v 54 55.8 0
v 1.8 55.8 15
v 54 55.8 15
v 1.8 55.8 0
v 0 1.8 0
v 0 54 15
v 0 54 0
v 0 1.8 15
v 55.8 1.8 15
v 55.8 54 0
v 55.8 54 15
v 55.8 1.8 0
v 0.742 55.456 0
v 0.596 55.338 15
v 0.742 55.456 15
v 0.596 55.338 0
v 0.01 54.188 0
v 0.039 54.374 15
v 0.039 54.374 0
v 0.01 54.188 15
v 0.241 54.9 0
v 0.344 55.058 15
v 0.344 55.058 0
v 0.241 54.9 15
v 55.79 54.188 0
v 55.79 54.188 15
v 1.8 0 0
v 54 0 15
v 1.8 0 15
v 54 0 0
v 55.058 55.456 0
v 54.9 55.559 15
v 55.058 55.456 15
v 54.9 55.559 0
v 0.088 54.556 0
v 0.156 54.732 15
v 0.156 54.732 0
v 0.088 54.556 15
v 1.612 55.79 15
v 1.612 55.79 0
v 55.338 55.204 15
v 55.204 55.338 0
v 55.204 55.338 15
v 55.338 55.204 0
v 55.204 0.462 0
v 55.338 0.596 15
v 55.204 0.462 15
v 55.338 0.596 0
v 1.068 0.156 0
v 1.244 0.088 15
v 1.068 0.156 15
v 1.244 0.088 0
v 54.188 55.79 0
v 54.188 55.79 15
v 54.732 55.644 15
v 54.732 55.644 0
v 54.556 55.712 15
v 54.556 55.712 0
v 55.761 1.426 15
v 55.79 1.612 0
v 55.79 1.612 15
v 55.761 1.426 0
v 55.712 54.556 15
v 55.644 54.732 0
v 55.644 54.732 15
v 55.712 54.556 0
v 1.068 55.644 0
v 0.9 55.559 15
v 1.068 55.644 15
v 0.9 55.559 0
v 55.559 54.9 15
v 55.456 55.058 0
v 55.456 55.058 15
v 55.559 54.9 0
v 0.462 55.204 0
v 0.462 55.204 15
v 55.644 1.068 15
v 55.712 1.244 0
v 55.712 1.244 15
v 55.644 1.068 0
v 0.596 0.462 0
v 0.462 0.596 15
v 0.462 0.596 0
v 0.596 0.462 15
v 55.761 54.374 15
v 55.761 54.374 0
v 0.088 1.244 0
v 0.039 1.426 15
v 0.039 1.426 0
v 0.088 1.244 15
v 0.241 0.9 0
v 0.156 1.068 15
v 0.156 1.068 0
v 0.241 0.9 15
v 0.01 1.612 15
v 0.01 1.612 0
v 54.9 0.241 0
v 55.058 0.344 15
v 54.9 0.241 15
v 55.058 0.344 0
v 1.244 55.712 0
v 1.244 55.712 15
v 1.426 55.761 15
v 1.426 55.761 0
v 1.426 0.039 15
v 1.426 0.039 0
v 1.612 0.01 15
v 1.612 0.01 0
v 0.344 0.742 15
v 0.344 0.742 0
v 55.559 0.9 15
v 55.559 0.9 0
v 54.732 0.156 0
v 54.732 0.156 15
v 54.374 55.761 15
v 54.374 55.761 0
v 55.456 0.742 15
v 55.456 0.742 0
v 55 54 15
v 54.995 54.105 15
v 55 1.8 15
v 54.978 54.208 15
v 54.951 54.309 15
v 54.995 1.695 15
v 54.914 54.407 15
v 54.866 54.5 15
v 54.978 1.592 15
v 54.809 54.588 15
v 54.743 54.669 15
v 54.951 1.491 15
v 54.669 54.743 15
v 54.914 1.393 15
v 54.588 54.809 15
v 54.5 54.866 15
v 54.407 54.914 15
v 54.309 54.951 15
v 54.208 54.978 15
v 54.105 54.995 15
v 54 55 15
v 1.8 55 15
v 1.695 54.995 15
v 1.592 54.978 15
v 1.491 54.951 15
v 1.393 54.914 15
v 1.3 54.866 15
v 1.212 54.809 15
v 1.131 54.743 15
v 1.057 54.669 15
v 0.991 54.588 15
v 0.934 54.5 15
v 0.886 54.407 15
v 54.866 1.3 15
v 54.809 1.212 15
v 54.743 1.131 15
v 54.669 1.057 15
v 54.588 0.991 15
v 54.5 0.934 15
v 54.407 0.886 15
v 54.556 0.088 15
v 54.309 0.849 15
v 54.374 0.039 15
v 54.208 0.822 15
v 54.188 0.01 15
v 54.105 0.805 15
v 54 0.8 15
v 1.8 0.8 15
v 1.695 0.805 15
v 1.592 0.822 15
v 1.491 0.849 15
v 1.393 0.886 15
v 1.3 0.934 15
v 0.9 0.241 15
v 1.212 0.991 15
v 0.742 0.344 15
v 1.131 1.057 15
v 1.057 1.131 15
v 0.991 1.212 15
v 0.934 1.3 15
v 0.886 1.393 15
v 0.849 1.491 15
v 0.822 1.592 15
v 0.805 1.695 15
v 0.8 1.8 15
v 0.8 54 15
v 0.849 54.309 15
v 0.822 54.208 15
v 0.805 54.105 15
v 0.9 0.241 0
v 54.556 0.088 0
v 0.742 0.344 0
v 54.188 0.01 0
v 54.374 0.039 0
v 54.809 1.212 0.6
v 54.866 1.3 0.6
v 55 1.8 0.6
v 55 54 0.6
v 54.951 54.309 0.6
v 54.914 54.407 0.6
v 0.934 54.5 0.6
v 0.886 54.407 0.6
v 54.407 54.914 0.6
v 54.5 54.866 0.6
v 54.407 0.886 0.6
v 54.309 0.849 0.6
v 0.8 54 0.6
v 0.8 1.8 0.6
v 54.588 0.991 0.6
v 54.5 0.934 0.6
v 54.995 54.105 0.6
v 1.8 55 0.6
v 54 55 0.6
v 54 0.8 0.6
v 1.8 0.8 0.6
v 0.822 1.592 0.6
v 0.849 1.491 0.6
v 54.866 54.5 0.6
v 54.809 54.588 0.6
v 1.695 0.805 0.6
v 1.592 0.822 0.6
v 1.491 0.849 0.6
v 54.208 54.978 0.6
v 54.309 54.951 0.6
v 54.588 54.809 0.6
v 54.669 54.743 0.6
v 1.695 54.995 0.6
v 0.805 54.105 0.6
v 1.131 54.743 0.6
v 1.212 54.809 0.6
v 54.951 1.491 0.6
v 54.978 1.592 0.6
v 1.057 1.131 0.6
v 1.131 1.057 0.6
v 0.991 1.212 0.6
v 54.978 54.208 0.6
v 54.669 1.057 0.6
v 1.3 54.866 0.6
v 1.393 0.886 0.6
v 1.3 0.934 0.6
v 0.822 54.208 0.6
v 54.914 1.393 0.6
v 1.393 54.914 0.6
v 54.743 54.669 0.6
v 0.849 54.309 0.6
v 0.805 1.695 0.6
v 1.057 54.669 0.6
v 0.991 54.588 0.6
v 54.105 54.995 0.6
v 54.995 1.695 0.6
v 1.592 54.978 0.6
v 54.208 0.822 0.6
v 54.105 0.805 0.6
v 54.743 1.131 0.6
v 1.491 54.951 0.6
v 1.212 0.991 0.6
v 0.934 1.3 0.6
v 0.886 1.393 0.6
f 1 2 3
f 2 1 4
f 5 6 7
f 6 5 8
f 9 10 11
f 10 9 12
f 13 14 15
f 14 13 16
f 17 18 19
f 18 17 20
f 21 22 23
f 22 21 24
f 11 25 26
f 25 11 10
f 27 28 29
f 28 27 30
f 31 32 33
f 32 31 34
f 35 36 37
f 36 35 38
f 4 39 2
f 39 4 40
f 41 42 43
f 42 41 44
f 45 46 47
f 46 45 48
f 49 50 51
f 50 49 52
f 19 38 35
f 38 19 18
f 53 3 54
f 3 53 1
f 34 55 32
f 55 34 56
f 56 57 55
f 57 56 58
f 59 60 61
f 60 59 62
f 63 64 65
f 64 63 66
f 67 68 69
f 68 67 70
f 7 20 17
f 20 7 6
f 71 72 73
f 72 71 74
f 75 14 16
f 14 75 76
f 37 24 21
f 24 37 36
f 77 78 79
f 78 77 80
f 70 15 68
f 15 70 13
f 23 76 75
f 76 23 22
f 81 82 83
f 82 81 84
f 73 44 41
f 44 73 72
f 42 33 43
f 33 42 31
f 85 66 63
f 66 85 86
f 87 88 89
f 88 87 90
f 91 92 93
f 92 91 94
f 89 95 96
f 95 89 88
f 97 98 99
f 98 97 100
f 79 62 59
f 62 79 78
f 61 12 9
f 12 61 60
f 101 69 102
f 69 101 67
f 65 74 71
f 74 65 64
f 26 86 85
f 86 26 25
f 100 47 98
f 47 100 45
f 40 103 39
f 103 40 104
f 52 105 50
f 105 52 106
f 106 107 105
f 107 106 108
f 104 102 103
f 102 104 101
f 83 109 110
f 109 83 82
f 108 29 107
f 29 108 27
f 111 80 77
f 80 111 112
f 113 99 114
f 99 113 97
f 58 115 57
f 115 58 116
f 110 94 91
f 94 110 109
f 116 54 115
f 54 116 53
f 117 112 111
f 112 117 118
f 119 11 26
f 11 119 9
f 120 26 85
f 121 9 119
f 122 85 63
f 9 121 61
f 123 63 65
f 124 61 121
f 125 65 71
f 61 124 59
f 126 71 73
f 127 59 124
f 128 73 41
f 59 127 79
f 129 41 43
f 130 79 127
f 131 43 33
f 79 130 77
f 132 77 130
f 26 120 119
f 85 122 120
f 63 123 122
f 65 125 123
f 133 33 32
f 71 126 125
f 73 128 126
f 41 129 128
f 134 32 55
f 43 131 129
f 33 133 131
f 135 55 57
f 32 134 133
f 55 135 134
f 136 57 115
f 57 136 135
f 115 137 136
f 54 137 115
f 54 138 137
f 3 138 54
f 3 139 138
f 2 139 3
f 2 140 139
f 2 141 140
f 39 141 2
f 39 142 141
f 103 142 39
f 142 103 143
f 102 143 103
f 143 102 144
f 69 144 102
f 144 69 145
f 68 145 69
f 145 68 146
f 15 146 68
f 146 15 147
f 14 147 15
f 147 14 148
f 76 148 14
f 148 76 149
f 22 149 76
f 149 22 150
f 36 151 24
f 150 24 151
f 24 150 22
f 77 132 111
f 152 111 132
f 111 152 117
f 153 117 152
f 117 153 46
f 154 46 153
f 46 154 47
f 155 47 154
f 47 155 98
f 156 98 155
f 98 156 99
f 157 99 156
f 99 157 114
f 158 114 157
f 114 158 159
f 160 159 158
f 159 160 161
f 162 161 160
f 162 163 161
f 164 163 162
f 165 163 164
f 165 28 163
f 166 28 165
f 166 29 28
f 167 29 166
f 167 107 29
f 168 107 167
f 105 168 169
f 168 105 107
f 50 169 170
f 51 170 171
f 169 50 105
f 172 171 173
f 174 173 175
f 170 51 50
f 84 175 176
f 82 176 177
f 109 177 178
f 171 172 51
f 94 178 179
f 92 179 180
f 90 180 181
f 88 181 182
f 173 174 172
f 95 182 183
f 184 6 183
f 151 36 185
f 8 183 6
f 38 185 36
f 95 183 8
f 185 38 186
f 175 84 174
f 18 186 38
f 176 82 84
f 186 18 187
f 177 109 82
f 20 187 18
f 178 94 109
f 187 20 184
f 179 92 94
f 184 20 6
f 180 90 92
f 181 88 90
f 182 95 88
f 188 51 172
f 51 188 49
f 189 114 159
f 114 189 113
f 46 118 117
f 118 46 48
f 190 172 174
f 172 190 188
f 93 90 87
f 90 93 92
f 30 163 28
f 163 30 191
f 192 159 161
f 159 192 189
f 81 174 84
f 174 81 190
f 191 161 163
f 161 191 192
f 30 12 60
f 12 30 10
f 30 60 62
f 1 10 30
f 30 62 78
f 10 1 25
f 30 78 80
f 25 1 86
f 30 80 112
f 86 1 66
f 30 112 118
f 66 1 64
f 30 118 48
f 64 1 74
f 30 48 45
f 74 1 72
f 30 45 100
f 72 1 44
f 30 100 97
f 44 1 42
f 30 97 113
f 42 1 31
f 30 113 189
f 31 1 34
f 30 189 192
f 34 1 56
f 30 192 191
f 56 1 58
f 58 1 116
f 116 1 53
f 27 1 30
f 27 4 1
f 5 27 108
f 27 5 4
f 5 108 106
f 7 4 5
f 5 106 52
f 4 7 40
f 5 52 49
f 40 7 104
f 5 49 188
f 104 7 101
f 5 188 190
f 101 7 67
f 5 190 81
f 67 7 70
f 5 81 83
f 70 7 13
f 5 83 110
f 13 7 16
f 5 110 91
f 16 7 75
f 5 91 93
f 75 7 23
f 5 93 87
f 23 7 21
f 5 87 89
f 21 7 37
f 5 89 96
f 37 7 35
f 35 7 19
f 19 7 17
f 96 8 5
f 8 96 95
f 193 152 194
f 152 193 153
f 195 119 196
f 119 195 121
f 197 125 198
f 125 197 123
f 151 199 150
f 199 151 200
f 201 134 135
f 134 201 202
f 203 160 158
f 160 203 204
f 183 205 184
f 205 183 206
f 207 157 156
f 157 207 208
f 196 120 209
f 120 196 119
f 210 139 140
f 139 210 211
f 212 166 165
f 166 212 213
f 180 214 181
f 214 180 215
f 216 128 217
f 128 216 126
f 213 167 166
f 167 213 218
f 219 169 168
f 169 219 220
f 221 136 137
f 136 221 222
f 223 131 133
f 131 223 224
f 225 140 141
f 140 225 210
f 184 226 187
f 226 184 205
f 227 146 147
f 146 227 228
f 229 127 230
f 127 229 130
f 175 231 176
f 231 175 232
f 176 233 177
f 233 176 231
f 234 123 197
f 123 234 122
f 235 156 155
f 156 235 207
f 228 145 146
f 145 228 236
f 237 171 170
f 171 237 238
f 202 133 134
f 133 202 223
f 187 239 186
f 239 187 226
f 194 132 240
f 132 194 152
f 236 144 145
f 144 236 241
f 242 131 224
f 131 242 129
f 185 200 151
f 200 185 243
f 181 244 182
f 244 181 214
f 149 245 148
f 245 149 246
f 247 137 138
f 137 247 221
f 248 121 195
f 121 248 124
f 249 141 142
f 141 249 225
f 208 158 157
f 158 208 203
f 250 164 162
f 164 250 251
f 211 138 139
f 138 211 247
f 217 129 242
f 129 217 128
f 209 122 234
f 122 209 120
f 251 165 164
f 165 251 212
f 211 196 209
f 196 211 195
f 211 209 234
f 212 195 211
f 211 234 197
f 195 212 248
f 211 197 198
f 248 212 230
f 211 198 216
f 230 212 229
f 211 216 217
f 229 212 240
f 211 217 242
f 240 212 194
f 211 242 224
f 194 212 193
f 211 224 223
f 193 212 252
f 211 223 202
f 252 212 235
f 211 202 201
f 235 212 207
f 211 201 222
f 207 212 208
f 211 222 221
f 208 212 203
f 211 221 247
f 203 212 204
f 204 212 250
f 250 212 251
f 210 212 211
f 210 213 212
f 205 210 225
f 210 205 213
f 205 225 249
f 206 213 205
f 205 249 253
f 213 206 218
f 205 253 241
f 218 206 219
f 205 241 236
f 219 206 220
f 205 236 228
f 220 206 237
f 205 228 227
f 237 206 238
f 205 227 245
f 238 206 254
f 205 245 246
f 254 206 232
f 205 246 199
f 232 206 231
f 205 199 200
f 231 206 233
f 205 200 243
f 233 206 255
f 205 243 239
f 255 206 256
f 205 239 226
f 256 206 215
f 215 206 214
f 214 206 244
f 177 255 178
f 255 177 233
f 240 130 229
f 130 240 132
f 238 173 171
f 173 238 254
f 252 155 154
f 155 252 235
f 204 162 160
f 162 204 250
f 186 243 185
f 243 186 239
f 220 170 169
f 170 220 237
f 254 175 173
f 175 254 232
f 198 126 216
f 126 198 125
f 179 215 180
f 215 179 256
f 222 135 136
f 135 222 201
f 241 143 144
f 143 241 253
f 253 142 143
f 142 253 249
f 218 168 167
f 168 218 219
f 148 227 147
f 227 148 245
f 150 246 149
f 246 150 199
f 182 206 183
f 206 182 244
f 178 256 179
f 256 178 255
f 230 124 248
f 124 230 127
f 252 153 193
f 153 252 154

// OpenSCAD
// modular nozzle storage box
// version 0.0.1
// by pixelhaufen
// is licensed under CC BY-SA 3.0 -> https://creativecommons.org/licenses/by-sa/3.0/

//------------------------------------------------------------------
// User Inputs

// create a seperate model for nozzle module, heat break module, box, lid
type = "box"; // [nozzle module,heat break module,box,lid]

/* [nozzle module] */
nozzle_diameter = 6; // [2:1:12]
nozzle_total_hight = 13; // [5:1:30]
nozzle_threaded_hight = 8; // [5:1:25]

/* [heat break module] */
heat_break_diameter = 7; // [2:1:12]
heat_break_length = 23; // [10:1:50]

/* [box] */
rows = 6; // [2:1:20]
columns = 6; // [2:1:20]
clearance = 0.2; // [0:0.1:1]

/*[Hidden]*/
$fn=60;

//------------------------------------------------------------------
// Main

if (type=="nozzle module")
{
    nozzle_module(nozzle_total_hight, nozzle_threaded_hight, nozzle_diameter);
}
else if(type=="heat break module")
{
    heat_break_module(heat_break_diameter, heat_break_length, nozzle_diameter);
}
else if(type=="box")
{
    box(rows, columns, clearance, nozzle_total_hight);
}
else if(type=="lid")
{
    lid(rows, columns, clearance);
}

//------------------------------------------------------------------
// Modules

module nozzle_module(nozzle_total_hight, nozzle_threaded_hight, nozzle_diameter)
{
    difference()
    {
        main_box([nozzle_diameter+3,nozzle_diameter+3,nozzle_threaded_hight+1],radius=1);
        translate([nozzle_diameter/2+1.5,nozzle_diameter/2+1.5,0.6])
            cylinder(r1=nozzle_diameter/2+0.5, r2=nozzle_diameter/2+0.5, h=nozzle_threaded_hight+1, center=false);
    }
}

module heat_break_module(heat_break_diameter, heat_break_length, nozzle_diameter)
{
    heat_break_length_multiple = ceil((heat_break_length+3)/(nozzle_diameter+3));
    heat_break_diameter_multiple = ceil((heat_break_diameter+1.8)/(nozzle_diameter+3));
      
    difference()
    {
        main_box([(nozzle_diameter+3)*heat_break_diameter_multiple,(nozzle_diameter+3)*heat_break_length_multiple,nozzle_threaded_hight+1],radius=1);
        
        translate([((nozzle_diameter+3)*heat_break_diameter_multiple -
         (heat_break_diameter+1))/2,((nozzle_diameter+3)*heat_break_length_multiple -
         (heat_break_length+1))/2,0])
            translate([heat_break_diameter/2+0.5 ,heat_break_length/2+0.5 ,nozzle_threaded_hight+1])
                rotate([-90,0,0])
                    cylinder(r1=heat_break_diameter/2+0.5, r2=heat_break_diameter/2+0.5, h=heat_break_length+1, center=true);
    }
}

module box(rows, columns, clearance, nozzle_total_hight)
{
    difference()
    {
        main_box([(nozzle_diameter+3)*rows+clearance+1.6,(nozzle_diameter+3)*columns+clearance+1.6,nozzle_total_hight+2],radius=1.8);
        translate([0.8, 0.8, 0.6])
            main_box([(nozzle_diameter+3)*rows+clearance,(nozzle_diameter+3)*columns+clearance,nozzle_total_hight+2],radius=1);
    }
}

module lid(rows, columns, clearance)
{
    difference()
    {
        main_box([(nozzle_diameter+3)*rows+clearance+3.2,(nozzle_diameter+3)*columns+clearance+3.2,3],radius=2.6);
        translate([0.8, 0.8, 0.6])
            main_box([(nozzle_diameter+3)*rows+clearance+1.6,(nozzle_diameter+3)*columns+clearance+1.6,3],radius=1.8);
    }
}

module main_box(size,radius)
{
    hull()
    {
        translate([radius, radius, 0])
            cylinder(r1=radius, r2=radius, h=size[2], center=false);
        translate([size[0]-radius, radius, 0])
            cylinder(r1=radius, r2=radius, h=size[2], center=false);
        translate([radius, size[1]-radius, 0])
            cylinder(r1=radius, r2=radius, h=size[2], center=false);
        translate([size[0]-radius, size[1]-radius, 0])
            cylinder(r1=radius, r2=radius, h=size[2], center=false);
    }
}
